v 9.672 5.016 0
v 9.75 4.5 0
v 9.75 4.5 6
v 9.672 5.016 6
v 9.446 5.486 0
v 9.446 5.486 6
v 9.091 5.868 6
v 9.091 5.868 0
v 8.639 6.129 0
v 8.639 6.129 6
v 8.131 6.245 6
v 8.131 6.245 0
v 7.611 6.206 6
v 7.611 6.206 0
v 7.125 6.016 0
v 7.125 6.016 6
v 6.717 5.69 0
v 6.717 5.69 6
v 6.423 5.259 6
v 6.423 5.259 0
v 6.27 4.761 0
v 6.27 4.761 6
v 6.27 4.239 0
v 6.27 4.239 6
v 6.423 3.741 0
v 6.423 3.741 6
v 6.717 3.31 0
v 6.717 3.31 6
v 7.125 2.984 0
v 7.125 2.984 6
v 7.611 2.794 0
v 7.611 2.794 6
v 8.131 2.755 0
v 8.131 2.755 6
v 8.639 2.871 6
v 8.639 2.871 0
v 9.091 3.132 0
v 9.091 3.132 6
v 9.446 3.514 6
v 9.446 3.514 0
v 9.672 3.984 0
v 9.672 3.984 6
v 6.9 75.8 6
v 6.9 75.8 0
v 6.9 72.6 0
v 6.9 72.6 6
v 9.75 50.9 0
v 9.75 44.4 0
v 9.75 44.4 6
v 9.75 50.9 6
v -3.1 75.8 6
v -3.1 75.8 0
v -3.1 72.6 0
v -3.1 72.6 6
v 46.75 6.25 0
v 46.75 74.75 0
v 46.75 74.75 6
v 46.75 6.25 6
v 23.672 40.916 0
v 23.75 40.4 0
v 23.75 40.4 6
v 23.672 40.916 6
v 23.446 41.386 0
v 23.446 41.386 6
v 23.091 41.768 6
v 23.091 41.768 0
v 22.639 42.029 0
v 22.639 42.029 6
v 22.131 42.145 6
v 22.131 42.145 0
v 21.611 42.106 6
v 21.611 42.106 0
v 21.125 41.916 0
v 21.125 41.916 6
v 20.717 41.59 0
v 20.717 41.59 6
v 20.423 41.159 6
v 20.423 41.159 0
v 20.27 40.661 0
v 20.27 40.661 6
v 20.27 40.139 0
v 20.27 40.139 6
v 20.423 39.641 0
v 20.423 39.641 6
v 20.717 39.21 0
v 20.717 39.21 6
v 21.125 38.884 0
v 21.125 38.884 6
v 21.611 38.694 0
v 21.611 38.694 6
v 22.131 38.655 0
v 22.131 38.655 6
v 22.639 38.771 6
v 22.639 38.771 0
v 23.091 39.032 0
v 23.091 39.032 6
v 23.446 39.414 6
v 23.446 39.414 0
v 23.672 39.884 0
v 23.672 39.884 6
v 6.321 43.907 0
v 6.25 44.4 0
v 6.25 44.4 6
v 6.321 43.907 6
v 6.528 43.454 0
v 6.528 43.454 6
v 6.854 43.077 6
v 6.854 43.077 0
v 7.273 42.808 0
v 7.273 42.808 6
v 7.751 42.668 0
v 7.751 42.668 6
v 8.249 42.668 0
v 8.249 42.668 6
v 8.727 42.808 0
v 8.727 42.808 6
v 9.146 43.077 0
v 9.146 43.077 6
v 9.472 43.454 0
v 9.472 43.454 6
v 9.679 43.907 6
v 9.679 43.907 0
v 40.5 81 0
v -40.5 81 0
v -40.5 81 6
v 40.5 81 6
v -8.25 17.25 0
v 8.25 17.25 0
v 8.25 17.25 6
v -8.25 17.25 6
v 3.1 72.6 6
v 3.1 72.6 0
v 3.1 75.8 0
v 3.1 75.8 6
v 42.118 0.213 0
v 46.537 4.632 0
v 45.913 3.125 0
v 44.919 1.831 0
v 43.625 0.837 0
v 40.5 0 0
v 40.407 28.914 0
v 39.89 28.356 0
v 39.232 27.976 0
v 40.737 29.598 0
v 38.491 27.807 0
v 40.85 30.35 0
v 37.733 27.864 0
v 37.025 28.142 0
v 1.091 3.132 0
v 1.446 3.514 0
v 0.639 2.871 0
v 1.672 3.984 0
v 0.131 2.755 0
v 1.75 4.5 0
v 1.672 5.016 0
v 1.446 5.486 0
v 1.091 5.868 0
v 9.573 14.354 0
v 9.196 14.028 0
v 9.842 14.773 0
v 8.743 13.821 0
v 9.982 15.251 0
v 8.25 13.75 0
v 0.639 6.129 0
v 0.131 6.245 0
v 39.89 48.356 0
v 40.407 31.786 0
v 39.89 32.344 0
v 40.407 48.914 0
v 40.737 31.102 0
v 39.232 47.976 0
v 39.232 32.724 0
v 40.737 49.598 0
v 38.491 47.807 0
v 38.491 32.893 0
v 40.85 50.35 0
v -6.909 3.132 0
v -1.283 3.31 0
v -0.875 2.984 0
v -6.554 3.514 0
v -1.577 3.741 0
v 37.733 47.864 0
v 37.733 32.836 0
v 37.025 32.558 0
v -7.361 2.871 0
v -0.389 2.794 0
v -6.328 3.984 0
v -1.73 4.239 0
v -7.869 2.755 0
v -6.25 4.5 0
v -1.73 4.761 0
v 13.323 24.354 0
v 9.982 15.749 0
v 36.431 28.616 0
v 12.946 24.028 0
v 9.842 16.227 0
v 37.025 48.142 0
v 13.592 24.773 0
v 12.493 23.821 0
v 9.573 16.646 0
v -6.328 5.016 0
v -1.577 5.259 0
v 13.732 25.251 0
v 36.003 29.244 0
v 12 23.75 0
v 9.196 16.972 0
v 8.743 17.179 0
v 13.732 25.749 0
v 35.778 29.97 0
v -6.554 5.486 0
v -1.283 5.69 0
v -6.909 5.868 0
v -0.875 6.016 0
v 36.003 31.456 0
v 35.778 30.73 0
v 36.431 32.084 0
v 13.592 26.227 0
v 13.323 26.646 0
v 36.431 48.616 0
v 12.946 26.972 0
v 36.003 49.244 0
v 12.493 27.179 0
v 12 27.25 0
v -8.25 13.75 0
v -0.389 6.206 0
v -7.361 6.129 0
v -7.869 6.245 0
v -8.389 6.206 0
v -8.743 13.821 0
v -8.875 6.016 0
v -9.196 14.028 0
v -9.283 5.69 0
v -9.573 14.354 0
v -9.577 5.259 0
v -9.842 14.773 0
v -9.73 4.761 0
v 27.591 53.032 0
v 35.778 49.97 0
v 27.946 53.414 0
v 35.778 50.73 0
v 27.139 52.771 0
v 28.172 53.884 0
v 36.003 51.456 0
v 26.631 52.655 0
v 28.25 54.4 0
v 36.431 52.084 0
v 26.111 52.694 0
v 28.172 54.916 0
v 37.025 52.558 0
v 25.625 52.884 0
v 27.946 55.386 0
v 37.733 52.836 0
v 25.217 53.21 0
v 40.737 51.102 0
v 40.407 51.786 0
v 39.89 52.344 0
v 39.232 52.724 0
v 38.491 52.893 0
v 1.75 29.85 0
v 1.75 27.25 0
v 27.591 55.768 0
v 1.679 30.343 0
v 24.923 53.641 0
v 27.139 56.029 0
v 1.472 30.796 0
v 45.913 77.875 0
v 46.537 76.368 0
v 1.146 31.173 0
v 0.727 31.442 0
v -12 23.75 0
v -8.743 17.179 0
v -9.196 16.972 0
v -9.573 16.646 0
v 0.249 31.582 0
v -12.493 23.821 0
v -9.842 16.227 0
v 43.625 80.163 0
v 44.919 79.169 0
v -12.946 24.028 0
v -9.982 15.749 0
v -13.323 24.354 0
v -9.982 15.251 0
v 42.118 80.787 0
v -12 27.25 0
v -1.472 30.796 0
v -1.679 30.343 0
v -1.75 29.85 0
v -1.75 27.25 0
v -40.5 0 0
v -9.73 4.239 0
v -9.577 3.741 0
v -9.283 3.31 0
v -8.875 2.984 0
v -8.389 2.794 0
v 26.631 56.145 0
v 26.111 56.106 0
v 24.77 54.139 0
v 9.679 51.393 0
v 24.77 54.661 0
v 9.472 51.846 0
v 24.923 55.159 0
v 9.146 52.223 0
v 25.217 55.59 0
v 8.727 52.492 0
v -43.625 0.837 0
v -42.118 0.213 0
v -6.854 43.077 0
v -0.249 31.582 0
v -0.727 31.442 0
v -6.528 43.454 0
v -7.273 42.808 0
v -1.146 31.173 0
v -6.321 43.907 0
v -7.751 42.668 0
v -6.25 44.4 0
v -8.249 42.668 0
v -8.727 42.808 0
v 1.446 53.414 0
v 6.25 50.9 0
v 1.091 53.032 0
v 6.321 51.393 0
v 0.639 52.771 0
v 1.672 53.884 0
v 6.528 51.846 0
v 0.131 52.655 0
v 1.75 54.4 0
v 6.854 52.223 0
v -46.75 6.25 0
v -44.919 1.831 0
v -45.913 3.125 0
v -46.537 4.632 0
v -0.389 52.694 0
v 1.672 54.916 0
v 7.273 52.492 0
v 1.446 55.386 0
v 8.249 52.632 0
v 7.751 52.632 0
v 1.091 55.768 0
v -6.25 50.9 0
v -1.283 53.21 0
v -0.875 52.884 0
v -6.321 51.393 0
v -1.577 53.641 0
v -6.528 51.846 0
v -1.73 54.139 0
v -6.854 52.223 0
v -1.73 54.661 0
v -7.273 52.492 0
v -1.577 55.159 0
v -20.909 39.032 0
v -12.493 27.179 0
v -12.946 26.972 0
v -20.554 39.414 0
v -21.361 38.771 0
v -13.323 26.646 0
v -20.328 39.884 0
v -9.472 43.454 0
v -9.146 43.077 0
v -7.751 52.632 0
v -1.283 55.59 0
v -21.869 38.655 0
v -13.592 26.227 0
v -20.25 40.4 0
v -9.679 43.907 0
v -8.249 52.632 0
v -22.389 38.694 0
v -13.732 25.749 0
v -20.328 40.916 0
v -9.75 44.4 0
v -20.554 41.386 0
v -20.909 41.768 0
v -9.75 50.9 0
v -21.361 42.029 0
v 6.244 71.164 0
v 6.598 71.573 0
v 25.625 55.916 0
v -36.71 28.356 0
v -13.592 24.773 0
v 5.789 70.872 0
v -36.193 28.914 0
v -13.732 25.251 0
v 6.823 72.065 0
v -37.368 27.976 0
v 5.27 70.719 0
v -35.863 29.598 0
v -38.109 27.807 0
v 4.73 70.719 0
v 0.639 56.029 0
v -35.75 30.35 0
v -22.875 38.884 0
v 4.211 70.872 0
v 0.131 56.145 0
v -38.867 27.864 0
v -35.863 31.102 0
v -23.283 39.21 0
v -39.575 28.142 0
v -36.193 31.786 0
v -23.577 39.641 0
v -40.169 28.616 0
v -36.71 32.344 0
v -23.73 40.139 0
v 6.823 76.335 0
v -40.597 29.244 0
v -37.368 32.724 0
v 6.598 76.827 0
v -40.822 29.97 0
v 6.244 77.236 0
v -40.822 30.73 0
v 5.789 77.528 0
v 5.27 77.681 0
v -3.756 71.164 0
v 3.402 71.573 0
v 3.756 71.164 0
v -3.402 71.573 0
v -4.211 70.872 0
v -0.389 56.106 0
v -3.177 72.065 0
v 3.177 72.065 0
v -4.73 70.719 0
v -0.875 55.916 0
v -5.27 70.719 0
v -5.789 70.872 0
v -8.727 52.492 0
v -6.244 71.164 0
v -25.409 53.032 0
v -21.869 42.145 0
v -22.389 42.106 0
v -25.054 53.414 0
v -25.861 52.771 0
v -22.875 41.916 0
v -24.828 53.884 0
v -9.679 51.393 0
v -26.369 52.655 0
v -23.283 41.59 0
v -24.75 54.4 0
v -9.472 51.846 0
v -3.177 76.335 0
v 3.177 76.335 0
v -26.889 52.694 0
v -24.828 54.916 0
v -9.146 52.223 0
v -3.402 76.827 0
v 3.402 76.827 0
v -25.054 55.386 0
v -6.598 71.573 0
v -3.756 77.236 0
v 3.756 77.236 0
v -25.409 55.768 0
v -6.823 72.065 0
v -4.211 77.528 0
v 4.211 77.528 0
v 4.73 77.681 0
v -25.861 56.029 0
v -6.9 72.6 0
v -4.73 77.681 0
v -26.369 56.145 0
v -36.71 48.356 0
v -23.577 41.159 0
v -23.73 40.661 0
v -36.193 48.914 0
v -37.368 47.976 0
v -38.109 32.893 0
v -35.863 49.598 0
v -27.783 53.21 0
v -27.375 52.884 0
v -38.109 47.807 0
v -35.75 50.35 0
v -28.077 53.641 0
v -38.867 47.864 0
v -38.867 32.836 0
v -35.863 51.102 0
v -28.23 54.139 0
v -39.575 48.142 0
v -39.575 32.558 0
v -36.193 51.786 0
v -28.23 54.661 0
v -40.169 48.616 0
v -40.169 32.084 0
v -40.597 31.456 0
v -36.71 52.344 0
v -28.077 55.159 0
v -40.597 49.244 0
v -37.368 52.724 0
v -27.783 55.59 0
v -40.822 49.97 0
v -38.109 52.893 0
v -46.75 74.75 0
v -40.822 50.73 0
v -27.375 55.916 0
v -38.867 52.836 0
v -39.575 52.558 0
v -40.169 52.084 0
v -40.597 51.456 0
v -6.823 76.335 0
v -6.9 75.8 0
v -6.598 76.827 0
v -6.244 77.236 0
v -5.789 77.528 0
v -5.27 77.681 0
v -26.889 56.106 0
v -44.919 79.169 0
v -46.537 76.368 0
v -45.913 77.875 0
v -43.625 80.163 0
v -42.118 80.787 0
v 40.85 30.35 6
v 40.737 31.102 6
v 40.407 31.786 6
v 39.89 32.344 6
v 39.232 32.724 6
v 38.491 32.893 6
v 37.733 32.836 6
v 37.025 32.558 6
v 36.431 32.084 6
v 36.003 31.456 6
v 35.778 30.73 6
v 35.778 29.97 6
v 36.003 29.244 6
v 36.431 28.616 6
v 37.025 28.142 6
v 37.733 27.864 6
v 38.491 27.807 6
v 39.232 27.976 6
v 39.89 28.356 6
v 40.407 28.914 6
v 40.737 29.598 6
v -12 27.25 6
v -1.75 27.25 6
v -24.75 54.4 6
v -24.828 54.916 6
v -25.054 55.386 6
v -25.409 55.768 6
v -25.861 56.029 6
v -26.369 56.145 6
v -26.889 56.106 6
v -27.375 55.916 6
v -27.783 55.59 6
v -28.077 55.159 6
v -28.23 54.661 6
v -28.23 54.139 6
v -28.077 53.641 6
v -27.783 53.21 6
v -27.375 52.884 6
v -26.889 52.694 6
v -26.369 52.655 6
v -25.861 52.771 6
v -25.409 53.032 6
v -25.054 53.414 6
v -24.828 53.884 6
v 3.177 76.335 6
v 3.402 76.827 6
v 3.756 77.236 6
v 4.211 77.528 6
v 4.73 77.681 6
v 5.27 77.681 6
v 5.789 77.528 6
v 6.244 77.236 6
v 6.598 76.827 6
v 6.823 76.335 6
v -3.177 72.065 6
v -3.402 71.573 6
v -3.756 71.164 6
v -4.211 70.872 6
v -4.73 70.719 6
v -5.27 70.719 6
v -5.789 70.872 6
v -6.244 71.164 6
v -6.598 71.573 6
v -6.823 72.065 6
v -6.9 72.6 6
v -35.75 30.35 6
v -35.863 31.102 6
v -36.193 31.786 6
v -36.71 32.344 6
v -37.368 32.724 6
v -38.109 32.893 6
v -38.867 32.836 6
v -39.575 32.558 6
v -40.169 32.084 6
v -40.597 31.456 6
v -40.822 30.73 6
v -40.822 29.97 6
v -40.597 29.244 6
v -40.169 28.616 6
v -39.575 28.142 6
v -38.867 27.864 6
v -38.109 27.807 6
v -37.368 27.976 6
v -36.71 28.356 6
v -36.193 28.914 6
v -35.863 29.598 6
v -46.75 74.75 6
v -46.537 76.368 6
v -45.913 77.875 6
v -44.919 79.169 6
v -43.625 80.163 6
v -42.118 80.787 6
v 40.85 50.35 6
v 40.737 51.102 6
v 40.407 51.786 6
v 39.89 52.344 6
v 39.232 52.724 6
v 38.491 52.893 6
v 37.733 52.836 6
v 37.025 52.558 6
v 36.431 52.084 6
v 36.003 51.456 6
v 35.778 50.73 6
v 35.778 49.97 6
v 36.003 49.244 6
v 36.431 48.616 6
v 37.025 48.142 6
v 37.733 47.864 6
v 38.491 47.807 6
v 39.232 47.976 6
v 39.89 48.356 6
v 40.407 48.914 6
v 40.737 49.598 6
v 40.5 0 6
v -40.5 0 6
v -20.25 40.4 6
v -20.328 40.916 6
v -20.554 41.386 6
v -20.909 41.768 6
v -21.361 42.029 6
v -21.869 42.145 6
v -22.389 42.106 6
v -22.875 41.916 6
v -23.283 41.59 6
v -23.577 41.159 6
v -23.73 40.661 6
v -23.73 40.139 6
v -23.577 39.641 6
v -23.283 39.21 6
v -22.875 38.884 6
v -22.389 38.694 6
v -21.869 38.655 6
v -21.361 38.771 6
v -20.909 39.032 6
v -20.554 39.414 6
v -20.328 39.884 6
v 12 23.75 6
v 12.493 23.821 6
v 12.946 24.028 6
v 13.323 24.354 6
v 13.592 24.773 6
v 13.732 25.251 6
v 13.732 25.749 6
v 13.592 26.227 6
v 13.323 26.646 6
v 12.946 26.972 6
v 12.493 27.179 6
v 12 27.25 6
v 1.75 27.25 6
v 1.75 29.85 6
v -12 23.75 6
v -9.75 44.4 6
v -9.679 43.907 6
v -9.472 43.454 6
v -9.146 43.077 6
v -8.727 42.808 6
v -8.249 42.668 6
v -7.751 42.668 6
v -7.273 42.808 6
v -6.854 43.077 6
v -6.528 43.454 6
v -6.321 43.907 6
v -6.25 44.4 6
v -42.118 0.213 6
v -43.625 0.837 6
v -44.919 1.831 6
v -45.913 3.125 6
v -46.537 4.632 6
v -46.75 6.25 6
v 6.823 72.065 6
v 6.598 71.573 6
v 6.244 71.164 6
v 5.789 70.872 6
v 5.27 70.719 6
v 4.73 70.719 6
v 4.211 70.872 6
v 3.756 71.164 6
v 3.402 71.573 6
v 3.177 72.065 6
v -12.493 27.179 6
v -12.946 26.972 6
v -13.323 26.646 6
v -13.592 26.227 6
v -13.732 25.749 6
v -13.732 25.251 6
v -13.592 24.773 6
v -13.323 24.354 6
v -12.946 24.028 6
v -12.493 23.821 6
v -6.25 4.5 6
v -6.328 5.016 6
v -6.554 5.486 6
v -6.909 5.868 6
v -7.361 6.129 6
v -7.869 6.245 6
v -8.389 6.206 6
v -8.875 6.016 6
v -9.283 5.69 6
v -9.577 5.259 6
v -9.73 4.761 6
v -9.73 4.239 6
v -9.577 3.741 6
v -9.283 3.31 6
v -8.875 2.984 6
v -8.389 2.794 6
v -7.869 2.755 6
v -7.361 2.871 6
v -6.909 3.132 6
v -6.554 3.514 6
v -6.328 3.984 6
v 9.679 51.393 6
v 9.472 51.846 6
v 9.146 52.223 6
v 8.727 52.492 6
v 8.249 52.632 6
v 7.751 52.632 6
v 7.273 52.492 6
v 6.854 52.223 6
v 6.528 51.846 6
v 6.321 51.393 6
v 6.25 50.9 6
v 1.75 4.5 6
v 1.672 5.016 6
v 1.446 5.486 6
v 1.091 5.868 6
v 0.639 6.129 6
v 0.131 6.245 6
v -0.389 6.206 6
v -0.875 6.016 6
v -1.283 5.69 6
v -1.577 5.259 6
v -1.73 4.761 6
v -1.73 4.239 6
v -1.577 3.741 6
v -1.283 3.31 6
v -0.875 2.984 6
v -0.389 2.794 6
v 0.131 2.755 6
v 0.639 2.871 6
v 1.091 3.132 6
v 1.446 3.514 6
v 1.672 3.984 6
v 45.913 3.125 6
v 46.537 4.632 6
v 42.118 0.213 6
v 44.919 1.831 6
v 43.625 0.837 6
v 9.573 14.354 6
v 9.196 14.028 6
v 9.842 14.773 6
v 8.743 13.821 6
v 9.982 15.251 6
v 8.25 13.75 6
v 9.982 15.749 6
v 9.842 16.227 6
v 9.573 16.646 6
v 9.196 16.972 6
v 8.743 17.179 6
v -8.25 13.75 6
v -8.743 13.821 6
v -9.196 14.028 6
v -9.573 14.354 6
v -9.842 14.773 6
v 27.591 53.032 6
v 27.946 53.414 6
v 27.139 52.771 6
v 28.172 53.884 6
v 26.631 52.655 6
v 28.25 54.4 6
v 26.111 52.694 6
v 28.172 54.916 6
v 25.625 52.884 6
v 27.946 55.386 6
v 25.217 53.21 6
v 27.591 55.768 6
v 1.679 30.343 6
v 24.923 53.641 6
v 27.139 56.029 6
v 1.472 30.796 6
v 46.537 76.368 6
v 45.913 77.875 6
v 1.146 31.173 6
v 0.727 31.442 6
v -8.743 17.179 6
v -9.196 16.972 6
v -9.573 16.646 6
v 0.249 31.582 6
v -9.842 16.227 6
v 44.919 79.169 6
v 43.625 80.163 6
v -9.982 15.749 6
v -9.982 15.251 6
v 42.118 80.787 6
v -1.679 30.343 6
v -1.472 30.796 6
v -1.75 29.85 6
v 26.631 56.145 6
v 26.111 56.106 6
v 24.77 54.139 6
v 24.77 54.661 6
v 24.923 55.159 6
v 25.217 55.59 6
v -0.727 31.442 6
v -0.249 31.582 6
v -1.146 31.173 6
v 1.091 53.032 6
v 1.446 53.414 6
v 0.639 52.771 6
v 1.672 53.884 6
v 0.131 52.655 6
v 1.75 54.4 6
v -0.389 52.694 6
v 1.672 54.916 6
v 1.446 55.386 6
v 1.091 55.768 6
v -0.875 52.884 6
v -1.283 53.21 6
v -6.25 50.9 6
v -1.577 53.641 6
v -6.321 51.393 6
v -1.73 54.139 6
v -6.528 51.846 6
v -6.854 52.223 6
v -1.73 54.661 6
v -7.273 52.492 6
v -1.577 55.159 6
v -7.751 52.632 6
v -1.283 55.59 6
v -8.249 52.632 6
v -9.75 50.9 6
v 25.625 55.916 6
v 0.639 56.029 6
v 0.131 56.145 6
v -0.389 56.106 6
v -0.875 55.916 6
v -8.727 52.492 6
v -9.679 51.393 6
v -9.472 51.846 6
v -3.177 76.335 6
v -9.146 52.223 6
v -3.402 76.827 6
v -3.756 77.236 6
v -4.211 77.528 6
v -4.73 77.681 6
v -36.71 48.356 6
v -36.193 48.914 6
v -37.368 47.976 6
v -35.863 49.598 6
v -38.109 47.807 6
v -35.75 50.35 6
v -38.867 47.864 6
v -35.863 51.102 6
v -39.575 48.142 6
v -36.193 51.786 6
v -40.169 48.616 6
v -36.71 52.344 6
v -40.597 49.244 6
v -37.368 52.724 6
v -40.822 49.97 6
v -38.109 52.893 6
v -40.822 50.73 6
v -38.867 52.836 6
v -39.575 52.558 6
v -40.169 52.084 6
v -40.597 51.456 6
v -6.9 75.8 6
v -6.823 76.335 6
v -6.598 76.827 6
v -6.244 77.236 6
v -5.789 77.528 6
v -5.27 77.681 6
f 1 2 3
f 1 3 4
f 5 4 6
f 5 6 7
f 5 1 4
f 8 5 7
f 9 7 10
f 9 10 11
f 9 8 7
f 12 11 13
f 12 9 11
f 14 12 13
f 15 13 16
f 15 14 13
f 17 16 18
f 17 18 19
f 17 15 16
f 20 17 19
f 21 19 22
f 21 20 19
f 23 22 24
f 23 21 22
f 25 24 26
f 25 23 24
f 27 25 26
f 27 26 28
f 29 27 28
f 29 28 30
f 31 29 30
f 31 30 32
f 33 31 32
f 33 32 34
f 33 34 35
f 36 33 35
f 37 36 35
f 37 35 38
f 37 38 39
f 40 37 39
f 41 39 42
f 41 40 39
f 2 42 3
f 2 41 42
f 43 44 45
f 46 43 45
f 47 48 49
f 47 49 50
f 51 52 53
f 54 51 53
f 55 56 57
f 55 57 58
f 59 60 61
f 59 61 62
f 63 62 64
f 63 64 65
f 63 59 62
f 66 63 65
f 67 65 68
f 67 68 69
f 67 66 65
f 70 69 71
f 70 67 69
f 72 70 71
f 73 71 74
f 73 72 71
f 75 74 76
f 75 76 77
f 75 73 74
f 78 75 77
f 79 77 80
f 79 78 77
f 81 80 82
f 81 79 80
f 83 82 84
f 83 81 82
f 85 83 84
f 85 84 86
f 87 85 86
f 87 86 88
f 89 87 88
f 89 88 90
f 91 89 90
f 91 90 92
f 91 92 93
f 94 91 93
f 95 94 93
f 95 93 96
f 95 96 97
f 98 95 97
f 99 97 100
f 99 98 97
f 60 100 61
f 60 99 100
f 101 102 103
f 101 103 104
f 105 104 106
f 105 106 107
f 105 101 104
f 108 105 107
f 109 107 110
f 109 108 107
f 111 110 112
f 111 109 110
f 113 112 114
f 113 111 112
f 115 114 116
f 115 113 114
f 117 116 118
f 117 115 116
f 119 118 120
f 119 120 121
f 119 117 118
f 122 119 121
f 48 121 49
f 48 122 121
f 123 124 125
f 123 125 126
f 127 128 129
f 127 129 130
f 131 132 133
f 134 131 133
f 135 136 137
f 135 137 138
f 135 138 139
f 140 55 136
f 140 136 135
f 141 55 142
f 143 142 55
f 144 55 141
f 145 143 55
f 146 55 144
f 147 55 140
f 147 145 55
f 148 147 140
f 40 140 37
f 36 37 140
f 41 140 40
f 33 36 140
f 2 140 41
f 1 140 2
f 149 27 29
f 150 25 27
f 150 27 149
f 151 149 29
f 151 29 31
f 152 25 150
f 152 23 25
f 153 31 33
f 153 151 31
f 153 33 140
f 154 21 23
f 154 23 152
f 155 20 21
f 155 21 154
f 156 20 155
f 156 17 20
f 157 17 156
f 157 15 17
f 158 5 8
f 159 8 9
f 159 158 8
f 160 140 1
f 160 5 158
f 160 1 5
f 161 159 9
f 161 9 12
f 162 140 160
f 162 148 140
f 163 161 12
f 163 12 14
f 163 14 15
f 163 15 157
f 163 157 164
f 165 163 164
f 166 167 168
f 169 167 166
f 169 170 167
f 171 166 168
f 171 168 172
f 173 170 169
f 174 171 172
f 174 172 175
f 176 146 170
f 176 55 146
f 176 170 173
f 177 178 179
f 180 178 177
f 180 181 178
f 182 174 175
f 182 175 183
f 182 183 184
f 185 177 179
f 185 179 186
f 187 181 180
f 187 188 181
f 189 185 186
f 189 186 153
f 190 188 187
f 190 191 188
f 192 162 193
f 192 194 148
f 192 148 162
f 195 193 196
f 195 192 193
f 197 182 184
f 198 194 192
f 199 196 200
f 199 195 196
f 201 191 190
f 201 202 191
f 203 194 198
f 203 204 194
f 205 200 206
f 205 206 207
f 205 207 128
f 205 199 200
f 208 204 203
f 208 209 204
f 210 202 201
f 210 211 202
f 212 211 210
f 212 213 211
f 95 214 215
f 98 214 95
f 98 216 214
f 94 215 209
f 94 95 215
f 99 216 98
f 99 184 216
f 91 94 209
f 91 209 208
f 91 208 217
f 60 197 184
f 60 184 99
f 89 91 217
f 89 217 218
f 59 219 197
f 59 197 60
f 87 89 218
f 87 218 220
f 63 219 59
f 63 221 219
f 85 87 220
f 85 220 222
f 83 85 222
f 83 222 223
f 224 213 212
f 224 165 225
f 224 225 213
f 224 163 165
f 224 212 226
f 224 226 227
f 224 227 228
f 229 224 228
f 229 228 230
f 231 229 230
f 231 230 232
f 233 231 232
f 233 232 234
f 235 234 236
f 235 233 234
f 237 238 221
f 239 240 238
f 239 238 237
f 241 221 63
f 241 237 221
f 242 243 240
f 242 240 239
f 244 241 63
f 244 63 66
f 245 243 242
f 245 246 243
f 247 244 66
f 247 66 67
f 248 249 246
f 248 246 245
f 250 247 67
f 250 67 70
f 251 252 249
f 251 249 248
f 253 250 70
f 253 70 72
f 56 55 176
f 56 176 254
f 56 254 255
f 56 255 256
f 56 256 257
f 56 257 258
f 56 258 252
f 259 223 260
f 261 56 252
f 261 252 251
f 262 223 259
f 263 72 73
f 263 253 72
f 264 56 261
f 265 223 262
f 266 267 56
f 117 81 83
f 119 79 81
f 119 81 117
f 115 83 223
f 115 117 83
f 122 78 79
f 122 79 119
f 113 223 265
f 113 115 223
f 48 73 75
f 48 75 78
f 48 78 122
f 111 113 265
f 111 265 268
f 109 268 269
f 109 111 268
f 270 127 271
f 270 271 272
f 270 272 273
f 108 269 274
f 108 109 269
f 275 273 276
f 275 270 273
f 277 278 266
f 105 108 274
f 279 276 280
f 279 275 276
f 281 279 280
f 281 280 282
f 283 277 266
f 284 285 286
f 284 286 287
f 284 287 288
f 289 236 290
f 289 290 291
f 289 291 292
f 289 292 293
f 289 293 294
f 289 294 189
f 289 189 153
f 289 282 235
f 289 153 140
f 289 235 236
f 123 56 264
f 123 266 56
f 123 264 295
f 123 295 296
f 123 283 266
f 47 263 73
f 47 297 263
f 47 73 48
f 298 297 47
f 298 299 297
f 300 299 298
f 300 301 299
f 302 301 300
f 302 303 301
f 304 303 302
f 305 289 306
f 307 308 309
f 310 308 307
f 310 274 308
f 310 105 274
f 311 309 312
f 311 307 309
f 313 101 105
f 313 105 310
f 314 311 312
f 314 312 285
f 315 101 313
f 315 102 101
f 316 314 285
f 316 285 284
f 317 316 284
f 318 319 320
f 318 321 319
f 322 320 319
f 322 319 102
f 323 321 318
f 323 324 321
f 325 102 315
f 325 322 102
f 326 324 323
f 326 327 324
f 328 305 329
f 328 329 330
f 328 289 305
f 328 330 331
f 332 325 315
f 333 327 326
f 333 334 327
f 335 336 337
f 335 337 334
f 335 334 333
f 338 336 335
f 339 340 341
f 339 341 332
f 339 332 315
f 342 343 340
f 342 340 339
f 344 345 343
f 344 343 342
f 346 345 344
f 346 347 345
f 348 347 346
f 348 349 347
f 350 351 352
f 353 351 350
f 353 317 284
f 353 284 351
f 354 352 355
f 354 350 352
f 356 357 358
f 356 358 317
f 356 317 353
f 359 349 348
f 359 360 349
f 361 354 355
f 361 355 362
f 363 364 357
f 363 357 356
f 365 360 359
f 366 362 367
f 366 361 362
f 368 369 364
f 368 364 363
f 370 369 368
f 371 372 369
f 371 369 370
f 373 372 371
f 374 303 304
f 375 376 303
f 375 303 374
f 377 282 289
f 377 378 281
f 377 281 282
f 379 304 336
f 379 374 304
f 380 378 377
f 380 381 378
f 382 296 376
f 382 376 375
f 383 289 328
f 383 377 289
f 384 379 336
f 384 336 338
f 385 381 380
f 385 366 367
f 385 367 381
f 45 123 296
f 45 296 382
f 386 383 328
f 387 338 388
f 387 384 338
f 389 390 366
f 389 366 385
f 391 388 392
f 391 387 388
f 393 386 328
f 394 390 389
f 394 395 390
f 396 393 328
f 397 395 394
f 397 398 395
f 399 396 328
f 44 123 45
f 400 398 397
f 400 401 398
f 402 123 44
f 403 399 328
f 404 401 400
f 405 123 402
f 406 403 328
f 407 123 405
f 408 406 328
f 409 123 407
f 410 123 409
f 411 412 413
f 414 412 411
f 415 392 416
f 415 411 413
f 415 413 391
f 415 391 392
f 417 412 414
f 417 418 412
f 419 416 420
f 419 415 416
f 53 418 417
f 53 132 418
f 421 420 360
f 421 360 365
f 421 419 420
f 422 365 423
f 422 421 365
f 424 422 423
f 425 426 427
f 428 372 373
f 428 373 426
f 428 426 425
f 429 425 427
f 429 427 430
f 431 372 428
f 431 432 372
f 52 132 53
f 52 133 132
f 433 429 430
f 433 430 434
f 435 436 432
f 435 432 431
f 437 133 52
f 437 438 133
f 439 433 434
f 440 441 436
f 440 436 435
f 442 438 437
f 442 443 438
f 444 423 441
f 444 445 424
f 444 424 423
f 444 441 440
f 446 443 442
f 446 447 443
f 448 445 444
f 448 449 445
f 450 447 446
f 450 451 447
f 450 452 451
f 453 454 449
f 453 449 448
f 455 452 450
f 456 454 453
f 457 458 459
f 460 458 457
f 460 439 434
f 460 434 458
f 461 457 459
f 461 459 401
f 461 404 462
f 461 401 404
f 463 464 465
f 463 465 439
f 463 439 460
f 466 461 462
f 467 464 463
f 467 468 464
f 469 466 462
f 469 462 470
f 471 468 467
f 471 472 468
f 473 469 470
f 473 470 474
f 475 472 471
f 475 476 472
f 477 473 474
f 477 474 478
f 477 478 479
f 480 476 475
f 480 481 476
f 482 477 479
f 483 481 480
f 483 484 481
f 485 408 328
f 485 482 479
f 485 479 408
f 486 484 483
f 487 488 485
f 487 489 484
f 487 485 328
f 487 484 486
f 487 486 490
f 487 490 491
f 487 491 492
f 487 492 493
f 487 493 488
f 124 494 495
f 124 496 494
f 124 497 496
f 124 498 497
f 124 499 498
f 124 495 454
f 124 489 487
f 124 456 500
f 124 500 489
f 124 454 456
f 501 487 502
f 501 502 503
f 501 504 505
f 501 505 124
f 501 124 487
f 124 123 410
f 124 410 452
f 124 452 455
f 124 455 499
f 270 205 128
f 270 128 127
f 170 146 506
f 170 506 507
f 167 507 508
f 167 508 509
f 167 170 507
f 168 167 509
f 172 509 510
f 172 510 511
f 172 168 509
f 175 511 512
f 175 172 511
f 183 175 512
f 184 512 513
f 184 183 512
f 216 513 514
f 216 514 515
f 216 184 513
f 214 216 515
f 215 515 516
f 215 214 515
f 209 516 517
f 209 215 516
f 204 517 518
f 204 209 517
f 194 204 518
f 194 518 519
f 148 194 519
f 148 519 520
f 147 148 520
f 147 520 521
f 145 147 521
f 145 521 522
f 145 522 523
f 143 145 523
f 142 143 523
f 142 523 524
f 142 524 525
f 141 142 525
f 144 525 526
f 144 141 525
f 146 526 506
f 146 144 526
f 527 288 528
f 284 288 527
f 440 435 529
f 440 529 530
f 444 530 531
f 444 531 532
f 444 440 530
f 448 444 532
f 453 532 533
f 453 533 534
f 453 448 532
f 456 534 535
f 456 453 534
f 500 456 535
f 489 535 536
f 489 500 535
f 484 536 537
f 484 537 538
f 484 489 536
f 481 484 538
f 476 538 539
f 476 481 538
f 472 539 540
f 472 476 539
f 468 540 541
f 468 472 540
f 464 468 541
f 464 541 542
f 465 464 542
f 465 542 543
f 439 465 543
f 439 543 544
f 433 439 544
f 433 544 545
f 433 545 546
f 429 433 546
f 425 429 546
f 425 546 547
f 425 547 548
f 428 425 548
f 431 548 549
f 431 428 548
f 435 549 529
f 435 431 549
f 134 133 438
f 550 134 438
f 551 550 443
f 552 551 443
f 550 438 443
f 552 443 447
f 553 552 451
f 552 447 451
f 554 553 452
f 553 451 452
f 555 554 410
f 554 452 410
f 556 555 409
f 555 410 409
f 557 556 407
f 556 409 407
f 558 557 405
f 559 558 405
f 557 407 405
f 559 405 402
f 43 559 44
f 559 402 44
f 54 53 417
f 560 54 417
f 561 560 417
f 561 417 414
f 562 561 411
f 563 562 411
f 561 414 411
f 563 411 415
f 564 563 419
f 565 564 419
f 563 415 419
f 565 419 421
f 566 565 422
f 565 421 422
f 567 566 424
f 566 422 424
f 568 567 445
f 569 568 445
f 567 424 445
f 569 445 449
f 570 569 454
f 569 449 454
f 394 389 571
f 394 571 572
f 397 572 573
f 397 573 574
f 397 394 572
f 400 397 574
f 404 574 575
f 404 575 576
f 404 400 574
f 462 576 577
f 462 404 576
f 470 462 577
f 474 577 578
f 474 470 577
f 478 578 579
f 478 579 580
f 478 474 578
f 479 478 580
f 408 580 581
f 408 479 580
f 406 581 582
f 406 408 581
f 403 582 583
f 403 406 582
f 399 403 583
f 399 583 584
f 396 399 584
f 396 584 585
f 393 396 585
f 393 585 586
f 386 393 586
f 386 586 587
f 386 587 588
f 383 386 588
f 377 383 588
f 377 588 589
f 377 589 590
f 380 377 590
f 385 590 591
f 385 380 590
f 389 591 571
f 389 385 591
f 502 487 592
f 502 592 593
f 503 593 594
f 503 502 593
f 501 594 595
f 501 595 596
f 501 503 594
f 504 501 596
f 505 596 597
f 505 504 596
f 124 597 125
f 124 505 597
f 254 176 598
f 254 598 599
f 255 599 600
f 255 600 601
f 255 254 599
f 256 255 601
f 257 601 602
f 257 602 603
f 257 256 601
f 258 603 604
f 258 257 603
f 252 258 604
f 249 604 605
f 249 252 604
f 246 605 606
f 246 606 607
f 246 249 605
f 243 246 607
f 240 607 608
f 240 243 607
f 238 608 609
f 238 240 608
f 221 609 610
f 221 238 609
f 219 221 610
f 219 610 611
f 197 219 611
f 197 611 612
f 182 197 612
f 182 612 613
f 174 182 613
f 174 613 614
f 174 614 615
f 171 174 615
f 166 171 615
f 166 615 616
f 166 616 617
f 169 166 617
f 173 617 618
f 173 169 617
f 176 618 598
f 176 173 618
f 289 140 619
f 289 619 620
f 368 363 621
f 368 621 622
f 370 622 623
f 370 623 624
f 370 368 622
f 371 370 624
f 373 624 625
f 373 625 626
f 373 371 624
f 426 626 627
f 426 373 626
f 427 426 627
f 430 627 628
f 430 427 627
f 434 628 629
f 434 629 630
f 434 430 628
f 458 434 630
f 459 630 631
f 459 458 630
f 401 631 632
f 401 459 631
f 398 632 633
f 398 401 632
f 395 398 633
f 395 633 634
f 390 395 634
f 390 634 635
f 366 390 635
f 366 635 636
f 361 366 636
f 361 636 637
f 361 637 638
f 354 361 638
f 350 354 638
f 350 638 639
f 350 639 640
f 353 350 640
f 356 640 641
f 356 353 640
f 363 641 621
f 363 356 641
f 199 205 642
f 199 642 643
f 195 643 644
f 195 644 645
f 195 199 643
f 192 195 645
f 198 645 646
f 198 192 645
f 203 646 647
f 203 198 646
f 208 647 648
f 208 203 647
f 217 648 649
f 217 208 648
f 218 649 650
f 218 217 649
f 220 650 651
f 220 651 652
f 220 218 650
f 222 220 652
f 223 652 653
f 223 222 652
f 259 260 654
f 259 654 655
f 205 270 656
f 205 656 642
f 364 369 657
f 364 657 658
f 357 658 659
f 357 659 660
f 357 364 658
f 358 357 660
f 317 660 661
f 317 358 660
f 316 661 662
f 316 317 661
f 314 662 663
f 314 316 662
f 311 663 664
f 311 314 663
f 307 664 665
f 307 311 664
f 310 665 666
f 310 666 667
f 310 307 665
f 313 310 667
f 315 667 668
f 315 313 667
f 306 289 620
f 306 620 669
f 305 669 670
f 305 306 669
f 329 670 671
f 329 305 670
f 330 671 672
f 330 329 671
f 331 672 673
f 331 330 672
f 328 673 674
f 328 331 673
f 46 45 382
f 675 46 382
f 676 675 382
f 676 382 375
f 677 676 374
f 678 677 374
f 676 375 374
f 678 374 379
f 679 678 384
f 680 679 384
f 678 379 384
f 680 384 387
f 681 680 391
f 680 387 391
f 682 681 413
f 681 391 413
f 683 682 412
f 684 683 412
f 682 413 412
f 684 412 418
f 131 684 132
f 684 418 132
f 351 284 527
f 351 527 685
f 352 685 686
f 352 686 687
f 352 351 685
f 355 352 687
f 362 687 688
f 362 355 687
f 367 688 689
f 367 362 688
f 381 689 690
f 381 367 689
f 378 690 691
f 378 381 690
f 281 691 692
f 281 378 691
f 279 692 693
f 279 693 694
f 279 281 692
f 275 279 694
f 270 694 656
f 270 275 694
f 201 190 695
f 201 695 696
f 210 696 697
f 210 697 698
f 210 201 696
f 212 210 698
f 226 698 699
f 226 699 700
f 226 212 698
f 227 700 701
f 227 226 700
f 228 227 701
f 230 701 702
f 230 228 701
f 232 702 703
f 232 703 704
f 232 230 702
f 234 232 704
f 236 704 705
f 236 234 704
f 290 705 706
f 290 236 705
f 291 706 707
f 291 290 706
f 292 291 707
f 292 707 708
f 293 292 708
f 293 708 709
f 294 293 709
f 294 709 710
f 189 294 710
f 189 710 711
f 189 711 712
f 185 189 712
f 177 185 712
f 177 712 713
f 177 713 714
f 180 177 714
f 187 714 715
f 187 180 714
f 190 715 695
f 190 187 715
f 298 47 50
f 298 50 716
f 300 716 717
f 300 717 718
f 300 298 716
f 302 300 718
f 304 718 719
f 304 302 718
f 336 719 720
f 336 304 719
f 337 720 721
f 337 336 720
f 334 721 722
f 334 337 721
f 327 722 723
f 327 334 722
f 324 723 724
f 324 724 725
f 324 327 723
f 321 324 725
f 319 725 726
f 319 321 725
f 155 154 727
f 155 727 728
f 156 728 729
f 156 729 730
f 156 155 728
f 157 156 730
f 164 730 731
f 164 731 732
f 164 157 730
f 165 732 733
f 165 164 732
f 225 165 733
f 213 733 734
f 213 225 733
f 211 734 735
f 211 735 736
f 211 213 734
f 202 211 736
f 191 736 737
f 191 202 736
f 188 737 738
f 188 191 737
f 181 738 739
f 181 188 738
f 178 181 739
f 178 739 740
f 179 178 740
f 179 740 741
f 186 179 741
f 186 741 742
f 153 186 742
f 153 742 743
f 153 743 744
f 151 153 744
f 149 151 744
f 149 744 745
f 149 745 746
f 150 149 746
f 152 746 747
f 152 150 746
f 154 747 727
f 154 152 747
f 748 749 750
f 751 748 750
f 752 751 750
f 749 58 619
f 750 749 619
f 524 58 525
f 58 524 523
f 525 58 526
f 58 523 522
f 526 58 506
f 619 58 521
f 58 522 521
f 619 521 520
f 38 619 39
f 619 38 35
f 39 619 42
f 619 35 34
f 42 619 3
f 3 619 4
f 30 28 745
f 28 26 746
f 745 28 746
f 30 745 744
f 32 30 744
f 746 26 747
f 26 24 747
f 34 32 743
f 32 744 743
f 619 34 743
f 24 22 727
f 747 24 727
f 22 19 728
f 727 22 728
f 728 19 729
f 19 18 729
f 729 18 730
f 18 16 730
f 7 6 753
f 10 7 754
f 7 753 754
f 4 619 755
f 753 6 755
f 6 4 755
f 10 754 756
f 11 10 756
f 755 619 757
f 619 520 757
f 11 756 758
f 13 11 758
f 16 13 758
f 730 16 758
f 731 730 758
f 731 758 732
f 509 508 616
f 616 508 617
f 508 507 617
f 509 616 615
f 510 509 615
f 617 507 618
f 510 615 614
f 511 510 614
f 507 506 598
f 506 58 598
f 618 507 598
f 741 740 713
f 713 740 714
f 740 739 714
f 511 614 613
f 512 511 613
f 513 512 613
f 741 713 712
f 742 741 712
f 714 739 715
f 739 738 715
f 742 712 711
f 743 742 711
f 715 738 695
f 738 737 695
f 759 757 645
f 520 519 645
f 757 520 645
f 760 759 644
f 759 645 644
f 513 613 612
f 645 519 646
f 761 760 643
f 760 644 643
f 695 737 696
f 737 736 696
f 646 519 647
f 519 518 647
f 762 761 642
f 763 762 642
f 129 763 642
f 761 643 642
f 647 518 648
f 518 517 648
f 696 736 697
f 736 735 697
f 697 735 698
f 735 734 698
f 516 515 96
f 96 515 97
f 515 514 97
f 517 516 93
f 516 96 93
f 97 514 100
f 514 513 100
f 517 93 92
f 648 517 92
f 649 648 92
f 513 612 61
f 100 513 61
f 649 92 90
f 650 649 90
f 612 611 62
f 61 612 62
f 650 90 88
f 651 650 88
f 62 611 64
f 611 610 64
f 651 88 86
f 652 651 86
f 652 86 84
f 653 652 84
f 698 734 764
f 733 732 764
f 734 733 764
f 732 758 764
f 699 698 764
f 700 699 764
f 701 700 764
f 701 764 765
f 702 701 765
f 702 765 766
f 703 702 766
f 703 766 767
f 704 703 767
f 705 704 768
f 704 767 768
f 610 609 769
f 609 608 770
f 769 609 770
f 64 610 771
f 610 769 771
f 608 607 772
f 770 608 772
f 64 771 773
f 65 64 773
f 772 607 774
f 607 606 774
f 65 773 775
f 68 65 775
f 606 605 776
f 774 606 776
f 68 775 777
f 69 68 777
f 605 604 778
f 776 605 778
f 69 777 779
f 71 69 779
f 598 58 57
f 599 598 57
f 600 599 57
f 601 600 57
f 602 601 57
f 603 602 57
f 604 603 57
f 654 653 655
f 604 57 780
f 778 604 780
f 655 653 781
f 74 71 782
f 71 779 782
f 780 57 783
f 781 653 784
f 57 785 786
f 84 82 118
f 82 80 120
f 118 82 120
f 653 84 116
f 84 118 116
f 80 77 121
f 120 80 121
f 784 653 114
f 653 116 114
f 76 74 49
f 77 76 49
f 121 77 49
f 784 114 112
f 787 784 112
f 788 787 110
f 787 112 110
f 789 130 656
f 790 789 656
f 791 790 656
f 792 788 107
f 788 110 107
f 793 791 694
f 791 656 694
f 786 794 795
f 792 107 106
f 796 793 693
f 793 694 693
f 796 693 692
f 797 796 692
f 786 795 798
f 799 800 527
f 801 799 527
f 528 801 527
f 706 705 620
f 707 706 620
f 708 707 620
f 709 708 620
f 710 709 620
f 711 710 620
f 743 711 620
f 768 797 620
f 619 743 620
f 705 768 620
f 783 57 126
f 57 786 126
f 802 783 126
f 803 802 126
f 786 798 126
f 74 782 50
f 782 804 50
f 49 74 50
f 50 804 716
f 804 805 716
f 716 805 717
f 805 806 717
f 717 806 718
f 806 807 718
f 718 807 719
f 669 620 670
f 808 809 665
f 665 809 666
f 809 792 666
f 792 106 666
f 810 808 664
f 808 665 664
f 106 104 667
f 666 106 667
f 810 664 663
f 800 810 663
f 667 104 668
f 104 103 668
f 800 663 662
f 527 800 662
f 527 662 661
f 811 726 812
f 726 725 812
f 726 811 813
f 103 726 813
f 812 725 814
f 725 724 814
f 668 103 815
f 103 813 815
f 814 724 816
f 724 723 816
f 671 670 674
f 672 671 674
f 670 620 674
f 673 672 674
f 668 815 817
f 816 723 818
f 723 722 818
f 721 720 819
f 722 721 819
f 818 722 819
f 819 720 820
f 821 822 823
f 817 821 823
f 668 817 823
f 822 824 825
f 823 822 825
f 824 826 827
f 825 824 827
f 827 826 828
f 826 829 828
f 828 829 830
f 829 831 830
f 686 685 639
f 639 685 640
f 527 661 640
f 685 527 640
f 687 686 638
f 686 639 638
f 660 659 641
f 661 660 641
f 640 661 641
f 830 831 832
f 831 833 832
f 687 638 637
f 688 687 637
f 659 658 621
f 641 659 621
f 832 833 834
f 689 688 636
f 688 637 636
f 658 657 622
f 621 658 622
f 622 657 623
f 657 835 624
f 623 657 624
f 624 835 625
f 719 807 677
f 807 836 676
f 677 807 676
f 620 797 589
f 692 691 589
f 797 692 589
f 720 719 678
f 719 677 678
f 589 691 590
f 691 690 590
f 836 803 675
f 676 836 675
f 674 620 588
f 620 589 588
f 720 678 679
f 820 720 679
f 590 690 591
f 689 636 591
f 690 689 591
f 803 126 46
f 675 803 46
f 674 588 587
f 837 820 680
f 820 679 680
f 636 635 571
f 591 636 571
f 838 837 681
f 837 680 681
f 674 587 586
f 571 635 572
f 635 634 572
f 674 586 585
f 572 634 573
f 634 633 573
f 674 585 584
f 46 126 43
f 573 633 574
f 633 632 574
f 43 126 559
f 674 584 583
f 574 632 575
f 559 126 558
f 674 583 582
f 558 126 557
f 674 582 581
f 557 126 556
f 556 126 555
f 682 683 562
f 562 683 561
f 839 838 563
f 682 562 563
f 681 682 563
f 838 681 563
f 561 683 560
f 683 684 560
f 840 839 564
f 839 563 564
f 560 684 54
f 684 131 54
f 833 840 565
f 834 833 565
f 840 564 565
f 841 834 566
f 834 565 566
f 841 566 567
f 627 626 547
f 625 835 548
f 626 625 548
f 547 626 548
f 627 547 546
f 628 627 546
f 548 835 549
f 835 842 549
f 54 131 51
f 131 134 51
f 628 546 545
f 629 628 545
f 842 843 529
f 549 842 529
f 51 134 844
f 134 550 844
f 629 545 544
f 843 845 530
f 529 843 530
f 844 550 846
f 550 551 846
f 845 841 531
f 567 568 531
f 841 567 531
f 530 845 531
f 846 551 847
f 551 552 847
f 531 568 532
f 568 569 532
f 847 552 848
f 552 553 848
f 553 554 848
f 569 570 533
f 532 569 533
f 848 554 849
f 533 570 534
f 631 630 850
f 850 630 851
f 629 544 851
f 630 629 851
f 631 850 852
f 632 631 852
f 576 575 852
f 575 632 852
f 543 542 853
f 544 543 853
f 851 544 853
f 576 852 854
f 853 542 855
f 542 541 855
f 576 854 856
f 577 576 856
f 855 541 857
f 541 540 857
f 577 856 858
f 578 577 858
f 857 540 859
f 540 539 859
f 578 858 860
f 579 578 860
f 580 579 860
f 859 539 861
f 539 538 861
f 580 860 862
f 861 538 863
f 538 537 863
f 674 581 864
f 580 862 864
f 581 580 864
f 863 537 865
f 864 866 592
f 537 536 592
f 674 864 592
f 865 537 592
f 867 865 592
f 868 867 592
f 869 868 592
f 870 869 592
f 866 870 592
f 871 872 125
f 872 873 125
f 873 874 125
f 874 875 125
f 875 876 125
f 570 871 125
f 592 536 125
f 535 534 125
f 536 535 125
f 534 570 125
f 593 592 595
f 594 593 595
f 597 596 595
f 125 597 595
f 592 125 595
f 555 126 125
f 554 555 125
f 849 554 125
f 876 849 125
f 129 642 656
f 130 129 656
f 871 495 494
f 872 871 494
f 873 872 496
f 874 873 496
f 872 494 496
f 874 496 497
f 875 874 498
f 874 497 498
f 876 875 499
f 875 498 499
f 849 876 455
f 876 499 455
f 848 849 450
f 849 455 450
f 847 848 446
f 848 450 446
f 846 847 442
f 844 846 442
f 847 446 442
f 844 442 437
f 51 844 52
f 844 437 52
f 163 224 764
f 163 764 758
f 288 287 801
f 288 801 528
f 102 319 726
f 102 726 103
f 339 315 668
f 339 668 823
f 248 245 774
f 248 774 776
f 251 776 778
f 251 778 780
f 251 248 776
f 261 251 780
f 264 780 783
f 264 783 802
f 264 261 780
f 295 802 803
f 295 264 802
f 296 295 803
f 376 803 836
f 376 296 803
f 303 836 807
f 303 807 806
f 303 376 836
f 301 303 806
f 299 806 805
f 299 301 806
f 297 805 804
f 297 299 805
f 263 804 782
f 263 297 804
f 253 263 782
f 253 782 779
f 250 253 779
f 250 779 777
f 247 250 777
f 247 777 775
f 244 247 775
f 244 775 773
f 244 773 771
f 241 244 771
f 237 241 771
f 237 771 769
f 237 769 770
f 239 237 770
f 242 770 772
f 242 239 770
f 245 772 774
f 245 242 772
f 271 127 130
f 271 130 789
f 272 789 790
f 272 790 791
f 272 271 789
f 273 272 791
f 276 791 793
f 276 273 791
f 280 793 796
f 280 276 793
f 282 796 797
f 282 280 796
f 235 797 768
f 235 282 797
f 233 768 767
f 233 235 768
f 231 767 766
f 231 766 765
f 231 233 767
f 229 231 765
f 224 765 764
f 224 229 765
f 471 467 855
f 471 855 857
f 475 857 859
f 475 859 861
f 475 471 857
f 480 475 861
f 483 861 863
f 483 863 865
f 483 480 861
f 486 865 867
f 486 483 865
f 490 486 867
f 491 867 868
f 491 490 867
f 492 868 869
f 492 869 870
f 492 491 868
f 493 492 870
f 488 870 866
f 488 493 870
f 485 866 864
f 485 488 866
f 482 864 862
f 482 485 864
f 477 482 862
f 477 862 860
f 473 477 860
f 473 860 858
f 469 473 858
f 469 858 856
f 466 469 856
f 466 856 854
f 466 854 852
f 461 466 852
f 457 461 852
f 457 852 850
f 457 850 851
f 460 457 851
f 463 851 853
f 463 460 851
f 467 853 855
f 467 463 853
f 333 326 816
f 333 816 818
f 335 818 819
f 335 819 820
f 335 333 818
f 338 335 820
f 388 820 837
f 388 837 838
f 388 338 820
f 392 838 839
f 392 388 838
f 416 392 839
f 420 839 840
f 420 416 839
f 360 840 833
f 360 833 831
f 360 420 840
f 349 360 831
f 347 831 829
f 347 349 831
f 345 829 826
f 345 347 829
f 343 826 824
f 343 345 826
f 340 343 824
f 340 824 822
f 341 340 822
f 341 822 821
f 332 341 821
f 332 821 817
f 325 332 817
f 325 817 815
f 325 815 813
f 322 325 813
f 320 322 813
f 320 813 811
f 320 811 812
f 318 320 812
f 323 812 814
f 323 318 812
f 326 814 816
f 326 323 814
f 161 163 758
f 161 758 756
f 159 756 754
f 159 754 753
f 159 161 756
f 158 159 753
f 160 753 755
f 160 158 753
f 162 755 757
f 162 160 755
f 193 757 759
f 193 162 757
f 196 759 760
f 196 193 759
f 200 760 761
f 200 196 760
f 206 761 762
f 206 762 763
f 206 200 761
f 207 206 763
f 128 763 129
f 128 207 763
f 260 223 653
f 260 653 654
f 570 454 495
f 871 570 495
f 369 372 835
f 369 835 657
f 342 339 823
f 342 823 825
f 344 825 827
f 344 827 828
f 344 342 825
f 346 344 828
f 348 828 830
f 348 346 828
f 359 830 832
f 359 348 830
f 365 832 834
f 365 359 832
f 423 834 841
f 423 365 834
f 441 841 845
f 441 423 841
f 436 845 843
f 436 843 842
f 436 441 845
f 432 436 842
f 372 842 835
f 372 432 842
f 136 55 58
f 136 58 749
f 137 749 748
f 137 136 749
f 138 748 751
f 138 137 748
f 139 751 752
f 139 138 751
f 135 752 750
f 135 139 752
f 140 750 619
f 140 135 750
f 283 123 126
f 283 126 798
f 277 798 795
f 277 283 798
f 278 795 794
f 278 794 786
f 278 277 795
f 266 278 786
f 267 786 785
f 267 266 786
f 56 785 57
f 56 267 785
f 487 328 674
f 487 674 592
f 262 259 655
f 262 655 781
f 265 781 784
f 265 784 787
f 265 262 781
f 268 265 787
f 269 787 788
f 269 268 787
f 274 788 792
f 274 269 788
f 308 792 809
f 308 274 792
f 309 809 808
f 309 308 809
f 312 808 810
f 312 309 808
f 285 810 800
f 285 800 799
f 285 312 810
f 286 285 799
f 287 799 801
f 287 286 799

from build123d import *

# Parameters (mm, degrees)
MODEL_R    = 1.75
MODEL_R_2  = 2.55
BASE_DEPTH = 6


with BuildPart() as part:
    # Model → Base (new body)
    with BuildSketch(Plane.XY):
        with BuildLine():
            Line((46.75, 74.75), (46.75, 6.25))
            ThreePointArc((46.75, 6.25), (44.919417382, 1.830582618), (40.5, 0))
            Line((40.5, 0), (-40.5, 0))
            ThreePointArc((-40.5, 0), (-44.919417382, 1.830582618), (-46.75, 6.25))
            Line((-46.75, 6.25), (-46.75, 74.75))
            ThreePointArc((-46.75, 74.75), (-44.919417382, 79.169417382), (-40.5, 81))
            Line((-40.5, 81), (40.5, 81))
            ThreePointArc((40.5, 81), (44.919417382, 79.169417382), (46.75, 74.75))
        make_face()
        with Locations((0, 4.5)):
            Circle(MODEL_R, mode=Mode.SUBTRACT)
        with Locations((8, 4.5)):
            Circle(MODEL_R, mode=Mode.SUBTRACT)
        with Locations((38.3, 50.35)):
            Circle(MODEL_R_2, mode=Mode.SUBTRACT)
        with Locations((38.3, 30.35)):
            Circle(MODEL_R_2, mode=Mode.SUBTRACT)
        with Locations((-38.3, 30.35)):
            Circle(MODEL_R_2, mode=Mode.SUBTRACT)
        with Locations((-38.3, 50.35)):
            Circle(MODEL_R_2, mode=Mode.SUBTRACT)
        with Locations((-8, 4.5)):
            Circle(MODEL_R, mode=Mode.SUBTRACT)
        with Locations((0, 54.4)):
            Circle(MODEL_R, mode=Mode.SUBTRACT)
        with Locations((26.5, 54.4)):
            Circle(MODEL_R, mode=Mode.SUBTRACT)
        with Locations((22, 40.4)):
            Circle(MODEL_R, mode=Mode.SUBTRACT)
        with Locations((-22, 40.4)):
            Circle(MODEL_R, mode=Mode.SUBTRACT)
        with Locations((-26.5, 54.4)):
            Circle(MODEL_R, mode=Mode.SUBTRACT)
        with BuildLine():
            Line((-3.1, 75.8), (-3.1, 72.6))
            ThreePointArc((-3.1, 72.6), (-5, 70.7), (-6.9, 72.6))
            Line((-6.9, 72.6), (-6.9, 75.8))
            ThreePointArc((-6.9, 75.8), (-5, 77.7), (-3.1, 75.8))
        make_face(mode=Mode.SUBTRACT)
        with BuildLine():
            Line((-9.75, 50.9), (-9.75, 44.4))
            ThreePointArc((-9.75, 44.4), (-8, 42.65), (-6.25, 44.4))
            Line((-6.25, 44.4), (-6.25, 50.9))
            ThreePointArc((-6.25, 50.9), (-8, 52.65), (-9.75, 50.9))
        make_face(mode=Mode.SUBTRACT)
        with BuildLine():
            Line((3.1, 72.6), (3.1, 75.8))
            ThreePointArc((3.1, 75.8), (5, 77.7), (6.9, 75.8))
            Line((6.9, 75.8), (6.9, 72.6))
            ThreePointArc((6.9, 72.6), (5, 70.7), (3.1, 72.6))
        make_face(mode=Mode.SUBTRACT)
        with BuildLine():
            Line((8.25, 17.25), (-8.25, 17.25))
            ThreePointArc((-8.25, 17.25), (-10, 15.5), (-8.25, 13.75))
            Line((-8.25, 13.75), (8.25, 13.75))
            ThreePointArc((8.25, 13.75), (10, 15.5), (8.25, 17.25))
        make_face(mode=Mode.SUBTRACT)
        with BuildLine():
            Line((9.75, 44.4), (9.75, 50.9))
            ThreePointArc((9.75, 50.9), (8, 52.65), (6.25, 50.9))
            Line((6.25, 50.9), (6.25, 44.4))
            ThreePointArc((6.25, 44.4), (8, 42.65), (9.75, 44.4))
        make_face(mode=Mode.SUBTRACT)
        with BuildLine():
            Line((-1.75, 29.85), (-1.75, 27.25))
            Line((-1.75, 27.25), (-12, 27.25))
            ThreePointArc((-12, 27.25), (-13.75, 25.5), (-12, 23.75))
            Line((-12, 23.75), (12, 23.75))
            ThreePointArc((12, 23.75), (13.75, 25.5), (12, 27.25))
            Line((12, 27.25), (1.75, 27.25))
            Line((1.75, 27.25), (1.75, 29.85))
            ThreePointArc((1.75, 29.85), (0, 31.6), (-1.75, 29.85))
        make_face(mode=Mode.SUBTRACT)
    extrude(amount=BASE_DEPTH)


solid = part.part
